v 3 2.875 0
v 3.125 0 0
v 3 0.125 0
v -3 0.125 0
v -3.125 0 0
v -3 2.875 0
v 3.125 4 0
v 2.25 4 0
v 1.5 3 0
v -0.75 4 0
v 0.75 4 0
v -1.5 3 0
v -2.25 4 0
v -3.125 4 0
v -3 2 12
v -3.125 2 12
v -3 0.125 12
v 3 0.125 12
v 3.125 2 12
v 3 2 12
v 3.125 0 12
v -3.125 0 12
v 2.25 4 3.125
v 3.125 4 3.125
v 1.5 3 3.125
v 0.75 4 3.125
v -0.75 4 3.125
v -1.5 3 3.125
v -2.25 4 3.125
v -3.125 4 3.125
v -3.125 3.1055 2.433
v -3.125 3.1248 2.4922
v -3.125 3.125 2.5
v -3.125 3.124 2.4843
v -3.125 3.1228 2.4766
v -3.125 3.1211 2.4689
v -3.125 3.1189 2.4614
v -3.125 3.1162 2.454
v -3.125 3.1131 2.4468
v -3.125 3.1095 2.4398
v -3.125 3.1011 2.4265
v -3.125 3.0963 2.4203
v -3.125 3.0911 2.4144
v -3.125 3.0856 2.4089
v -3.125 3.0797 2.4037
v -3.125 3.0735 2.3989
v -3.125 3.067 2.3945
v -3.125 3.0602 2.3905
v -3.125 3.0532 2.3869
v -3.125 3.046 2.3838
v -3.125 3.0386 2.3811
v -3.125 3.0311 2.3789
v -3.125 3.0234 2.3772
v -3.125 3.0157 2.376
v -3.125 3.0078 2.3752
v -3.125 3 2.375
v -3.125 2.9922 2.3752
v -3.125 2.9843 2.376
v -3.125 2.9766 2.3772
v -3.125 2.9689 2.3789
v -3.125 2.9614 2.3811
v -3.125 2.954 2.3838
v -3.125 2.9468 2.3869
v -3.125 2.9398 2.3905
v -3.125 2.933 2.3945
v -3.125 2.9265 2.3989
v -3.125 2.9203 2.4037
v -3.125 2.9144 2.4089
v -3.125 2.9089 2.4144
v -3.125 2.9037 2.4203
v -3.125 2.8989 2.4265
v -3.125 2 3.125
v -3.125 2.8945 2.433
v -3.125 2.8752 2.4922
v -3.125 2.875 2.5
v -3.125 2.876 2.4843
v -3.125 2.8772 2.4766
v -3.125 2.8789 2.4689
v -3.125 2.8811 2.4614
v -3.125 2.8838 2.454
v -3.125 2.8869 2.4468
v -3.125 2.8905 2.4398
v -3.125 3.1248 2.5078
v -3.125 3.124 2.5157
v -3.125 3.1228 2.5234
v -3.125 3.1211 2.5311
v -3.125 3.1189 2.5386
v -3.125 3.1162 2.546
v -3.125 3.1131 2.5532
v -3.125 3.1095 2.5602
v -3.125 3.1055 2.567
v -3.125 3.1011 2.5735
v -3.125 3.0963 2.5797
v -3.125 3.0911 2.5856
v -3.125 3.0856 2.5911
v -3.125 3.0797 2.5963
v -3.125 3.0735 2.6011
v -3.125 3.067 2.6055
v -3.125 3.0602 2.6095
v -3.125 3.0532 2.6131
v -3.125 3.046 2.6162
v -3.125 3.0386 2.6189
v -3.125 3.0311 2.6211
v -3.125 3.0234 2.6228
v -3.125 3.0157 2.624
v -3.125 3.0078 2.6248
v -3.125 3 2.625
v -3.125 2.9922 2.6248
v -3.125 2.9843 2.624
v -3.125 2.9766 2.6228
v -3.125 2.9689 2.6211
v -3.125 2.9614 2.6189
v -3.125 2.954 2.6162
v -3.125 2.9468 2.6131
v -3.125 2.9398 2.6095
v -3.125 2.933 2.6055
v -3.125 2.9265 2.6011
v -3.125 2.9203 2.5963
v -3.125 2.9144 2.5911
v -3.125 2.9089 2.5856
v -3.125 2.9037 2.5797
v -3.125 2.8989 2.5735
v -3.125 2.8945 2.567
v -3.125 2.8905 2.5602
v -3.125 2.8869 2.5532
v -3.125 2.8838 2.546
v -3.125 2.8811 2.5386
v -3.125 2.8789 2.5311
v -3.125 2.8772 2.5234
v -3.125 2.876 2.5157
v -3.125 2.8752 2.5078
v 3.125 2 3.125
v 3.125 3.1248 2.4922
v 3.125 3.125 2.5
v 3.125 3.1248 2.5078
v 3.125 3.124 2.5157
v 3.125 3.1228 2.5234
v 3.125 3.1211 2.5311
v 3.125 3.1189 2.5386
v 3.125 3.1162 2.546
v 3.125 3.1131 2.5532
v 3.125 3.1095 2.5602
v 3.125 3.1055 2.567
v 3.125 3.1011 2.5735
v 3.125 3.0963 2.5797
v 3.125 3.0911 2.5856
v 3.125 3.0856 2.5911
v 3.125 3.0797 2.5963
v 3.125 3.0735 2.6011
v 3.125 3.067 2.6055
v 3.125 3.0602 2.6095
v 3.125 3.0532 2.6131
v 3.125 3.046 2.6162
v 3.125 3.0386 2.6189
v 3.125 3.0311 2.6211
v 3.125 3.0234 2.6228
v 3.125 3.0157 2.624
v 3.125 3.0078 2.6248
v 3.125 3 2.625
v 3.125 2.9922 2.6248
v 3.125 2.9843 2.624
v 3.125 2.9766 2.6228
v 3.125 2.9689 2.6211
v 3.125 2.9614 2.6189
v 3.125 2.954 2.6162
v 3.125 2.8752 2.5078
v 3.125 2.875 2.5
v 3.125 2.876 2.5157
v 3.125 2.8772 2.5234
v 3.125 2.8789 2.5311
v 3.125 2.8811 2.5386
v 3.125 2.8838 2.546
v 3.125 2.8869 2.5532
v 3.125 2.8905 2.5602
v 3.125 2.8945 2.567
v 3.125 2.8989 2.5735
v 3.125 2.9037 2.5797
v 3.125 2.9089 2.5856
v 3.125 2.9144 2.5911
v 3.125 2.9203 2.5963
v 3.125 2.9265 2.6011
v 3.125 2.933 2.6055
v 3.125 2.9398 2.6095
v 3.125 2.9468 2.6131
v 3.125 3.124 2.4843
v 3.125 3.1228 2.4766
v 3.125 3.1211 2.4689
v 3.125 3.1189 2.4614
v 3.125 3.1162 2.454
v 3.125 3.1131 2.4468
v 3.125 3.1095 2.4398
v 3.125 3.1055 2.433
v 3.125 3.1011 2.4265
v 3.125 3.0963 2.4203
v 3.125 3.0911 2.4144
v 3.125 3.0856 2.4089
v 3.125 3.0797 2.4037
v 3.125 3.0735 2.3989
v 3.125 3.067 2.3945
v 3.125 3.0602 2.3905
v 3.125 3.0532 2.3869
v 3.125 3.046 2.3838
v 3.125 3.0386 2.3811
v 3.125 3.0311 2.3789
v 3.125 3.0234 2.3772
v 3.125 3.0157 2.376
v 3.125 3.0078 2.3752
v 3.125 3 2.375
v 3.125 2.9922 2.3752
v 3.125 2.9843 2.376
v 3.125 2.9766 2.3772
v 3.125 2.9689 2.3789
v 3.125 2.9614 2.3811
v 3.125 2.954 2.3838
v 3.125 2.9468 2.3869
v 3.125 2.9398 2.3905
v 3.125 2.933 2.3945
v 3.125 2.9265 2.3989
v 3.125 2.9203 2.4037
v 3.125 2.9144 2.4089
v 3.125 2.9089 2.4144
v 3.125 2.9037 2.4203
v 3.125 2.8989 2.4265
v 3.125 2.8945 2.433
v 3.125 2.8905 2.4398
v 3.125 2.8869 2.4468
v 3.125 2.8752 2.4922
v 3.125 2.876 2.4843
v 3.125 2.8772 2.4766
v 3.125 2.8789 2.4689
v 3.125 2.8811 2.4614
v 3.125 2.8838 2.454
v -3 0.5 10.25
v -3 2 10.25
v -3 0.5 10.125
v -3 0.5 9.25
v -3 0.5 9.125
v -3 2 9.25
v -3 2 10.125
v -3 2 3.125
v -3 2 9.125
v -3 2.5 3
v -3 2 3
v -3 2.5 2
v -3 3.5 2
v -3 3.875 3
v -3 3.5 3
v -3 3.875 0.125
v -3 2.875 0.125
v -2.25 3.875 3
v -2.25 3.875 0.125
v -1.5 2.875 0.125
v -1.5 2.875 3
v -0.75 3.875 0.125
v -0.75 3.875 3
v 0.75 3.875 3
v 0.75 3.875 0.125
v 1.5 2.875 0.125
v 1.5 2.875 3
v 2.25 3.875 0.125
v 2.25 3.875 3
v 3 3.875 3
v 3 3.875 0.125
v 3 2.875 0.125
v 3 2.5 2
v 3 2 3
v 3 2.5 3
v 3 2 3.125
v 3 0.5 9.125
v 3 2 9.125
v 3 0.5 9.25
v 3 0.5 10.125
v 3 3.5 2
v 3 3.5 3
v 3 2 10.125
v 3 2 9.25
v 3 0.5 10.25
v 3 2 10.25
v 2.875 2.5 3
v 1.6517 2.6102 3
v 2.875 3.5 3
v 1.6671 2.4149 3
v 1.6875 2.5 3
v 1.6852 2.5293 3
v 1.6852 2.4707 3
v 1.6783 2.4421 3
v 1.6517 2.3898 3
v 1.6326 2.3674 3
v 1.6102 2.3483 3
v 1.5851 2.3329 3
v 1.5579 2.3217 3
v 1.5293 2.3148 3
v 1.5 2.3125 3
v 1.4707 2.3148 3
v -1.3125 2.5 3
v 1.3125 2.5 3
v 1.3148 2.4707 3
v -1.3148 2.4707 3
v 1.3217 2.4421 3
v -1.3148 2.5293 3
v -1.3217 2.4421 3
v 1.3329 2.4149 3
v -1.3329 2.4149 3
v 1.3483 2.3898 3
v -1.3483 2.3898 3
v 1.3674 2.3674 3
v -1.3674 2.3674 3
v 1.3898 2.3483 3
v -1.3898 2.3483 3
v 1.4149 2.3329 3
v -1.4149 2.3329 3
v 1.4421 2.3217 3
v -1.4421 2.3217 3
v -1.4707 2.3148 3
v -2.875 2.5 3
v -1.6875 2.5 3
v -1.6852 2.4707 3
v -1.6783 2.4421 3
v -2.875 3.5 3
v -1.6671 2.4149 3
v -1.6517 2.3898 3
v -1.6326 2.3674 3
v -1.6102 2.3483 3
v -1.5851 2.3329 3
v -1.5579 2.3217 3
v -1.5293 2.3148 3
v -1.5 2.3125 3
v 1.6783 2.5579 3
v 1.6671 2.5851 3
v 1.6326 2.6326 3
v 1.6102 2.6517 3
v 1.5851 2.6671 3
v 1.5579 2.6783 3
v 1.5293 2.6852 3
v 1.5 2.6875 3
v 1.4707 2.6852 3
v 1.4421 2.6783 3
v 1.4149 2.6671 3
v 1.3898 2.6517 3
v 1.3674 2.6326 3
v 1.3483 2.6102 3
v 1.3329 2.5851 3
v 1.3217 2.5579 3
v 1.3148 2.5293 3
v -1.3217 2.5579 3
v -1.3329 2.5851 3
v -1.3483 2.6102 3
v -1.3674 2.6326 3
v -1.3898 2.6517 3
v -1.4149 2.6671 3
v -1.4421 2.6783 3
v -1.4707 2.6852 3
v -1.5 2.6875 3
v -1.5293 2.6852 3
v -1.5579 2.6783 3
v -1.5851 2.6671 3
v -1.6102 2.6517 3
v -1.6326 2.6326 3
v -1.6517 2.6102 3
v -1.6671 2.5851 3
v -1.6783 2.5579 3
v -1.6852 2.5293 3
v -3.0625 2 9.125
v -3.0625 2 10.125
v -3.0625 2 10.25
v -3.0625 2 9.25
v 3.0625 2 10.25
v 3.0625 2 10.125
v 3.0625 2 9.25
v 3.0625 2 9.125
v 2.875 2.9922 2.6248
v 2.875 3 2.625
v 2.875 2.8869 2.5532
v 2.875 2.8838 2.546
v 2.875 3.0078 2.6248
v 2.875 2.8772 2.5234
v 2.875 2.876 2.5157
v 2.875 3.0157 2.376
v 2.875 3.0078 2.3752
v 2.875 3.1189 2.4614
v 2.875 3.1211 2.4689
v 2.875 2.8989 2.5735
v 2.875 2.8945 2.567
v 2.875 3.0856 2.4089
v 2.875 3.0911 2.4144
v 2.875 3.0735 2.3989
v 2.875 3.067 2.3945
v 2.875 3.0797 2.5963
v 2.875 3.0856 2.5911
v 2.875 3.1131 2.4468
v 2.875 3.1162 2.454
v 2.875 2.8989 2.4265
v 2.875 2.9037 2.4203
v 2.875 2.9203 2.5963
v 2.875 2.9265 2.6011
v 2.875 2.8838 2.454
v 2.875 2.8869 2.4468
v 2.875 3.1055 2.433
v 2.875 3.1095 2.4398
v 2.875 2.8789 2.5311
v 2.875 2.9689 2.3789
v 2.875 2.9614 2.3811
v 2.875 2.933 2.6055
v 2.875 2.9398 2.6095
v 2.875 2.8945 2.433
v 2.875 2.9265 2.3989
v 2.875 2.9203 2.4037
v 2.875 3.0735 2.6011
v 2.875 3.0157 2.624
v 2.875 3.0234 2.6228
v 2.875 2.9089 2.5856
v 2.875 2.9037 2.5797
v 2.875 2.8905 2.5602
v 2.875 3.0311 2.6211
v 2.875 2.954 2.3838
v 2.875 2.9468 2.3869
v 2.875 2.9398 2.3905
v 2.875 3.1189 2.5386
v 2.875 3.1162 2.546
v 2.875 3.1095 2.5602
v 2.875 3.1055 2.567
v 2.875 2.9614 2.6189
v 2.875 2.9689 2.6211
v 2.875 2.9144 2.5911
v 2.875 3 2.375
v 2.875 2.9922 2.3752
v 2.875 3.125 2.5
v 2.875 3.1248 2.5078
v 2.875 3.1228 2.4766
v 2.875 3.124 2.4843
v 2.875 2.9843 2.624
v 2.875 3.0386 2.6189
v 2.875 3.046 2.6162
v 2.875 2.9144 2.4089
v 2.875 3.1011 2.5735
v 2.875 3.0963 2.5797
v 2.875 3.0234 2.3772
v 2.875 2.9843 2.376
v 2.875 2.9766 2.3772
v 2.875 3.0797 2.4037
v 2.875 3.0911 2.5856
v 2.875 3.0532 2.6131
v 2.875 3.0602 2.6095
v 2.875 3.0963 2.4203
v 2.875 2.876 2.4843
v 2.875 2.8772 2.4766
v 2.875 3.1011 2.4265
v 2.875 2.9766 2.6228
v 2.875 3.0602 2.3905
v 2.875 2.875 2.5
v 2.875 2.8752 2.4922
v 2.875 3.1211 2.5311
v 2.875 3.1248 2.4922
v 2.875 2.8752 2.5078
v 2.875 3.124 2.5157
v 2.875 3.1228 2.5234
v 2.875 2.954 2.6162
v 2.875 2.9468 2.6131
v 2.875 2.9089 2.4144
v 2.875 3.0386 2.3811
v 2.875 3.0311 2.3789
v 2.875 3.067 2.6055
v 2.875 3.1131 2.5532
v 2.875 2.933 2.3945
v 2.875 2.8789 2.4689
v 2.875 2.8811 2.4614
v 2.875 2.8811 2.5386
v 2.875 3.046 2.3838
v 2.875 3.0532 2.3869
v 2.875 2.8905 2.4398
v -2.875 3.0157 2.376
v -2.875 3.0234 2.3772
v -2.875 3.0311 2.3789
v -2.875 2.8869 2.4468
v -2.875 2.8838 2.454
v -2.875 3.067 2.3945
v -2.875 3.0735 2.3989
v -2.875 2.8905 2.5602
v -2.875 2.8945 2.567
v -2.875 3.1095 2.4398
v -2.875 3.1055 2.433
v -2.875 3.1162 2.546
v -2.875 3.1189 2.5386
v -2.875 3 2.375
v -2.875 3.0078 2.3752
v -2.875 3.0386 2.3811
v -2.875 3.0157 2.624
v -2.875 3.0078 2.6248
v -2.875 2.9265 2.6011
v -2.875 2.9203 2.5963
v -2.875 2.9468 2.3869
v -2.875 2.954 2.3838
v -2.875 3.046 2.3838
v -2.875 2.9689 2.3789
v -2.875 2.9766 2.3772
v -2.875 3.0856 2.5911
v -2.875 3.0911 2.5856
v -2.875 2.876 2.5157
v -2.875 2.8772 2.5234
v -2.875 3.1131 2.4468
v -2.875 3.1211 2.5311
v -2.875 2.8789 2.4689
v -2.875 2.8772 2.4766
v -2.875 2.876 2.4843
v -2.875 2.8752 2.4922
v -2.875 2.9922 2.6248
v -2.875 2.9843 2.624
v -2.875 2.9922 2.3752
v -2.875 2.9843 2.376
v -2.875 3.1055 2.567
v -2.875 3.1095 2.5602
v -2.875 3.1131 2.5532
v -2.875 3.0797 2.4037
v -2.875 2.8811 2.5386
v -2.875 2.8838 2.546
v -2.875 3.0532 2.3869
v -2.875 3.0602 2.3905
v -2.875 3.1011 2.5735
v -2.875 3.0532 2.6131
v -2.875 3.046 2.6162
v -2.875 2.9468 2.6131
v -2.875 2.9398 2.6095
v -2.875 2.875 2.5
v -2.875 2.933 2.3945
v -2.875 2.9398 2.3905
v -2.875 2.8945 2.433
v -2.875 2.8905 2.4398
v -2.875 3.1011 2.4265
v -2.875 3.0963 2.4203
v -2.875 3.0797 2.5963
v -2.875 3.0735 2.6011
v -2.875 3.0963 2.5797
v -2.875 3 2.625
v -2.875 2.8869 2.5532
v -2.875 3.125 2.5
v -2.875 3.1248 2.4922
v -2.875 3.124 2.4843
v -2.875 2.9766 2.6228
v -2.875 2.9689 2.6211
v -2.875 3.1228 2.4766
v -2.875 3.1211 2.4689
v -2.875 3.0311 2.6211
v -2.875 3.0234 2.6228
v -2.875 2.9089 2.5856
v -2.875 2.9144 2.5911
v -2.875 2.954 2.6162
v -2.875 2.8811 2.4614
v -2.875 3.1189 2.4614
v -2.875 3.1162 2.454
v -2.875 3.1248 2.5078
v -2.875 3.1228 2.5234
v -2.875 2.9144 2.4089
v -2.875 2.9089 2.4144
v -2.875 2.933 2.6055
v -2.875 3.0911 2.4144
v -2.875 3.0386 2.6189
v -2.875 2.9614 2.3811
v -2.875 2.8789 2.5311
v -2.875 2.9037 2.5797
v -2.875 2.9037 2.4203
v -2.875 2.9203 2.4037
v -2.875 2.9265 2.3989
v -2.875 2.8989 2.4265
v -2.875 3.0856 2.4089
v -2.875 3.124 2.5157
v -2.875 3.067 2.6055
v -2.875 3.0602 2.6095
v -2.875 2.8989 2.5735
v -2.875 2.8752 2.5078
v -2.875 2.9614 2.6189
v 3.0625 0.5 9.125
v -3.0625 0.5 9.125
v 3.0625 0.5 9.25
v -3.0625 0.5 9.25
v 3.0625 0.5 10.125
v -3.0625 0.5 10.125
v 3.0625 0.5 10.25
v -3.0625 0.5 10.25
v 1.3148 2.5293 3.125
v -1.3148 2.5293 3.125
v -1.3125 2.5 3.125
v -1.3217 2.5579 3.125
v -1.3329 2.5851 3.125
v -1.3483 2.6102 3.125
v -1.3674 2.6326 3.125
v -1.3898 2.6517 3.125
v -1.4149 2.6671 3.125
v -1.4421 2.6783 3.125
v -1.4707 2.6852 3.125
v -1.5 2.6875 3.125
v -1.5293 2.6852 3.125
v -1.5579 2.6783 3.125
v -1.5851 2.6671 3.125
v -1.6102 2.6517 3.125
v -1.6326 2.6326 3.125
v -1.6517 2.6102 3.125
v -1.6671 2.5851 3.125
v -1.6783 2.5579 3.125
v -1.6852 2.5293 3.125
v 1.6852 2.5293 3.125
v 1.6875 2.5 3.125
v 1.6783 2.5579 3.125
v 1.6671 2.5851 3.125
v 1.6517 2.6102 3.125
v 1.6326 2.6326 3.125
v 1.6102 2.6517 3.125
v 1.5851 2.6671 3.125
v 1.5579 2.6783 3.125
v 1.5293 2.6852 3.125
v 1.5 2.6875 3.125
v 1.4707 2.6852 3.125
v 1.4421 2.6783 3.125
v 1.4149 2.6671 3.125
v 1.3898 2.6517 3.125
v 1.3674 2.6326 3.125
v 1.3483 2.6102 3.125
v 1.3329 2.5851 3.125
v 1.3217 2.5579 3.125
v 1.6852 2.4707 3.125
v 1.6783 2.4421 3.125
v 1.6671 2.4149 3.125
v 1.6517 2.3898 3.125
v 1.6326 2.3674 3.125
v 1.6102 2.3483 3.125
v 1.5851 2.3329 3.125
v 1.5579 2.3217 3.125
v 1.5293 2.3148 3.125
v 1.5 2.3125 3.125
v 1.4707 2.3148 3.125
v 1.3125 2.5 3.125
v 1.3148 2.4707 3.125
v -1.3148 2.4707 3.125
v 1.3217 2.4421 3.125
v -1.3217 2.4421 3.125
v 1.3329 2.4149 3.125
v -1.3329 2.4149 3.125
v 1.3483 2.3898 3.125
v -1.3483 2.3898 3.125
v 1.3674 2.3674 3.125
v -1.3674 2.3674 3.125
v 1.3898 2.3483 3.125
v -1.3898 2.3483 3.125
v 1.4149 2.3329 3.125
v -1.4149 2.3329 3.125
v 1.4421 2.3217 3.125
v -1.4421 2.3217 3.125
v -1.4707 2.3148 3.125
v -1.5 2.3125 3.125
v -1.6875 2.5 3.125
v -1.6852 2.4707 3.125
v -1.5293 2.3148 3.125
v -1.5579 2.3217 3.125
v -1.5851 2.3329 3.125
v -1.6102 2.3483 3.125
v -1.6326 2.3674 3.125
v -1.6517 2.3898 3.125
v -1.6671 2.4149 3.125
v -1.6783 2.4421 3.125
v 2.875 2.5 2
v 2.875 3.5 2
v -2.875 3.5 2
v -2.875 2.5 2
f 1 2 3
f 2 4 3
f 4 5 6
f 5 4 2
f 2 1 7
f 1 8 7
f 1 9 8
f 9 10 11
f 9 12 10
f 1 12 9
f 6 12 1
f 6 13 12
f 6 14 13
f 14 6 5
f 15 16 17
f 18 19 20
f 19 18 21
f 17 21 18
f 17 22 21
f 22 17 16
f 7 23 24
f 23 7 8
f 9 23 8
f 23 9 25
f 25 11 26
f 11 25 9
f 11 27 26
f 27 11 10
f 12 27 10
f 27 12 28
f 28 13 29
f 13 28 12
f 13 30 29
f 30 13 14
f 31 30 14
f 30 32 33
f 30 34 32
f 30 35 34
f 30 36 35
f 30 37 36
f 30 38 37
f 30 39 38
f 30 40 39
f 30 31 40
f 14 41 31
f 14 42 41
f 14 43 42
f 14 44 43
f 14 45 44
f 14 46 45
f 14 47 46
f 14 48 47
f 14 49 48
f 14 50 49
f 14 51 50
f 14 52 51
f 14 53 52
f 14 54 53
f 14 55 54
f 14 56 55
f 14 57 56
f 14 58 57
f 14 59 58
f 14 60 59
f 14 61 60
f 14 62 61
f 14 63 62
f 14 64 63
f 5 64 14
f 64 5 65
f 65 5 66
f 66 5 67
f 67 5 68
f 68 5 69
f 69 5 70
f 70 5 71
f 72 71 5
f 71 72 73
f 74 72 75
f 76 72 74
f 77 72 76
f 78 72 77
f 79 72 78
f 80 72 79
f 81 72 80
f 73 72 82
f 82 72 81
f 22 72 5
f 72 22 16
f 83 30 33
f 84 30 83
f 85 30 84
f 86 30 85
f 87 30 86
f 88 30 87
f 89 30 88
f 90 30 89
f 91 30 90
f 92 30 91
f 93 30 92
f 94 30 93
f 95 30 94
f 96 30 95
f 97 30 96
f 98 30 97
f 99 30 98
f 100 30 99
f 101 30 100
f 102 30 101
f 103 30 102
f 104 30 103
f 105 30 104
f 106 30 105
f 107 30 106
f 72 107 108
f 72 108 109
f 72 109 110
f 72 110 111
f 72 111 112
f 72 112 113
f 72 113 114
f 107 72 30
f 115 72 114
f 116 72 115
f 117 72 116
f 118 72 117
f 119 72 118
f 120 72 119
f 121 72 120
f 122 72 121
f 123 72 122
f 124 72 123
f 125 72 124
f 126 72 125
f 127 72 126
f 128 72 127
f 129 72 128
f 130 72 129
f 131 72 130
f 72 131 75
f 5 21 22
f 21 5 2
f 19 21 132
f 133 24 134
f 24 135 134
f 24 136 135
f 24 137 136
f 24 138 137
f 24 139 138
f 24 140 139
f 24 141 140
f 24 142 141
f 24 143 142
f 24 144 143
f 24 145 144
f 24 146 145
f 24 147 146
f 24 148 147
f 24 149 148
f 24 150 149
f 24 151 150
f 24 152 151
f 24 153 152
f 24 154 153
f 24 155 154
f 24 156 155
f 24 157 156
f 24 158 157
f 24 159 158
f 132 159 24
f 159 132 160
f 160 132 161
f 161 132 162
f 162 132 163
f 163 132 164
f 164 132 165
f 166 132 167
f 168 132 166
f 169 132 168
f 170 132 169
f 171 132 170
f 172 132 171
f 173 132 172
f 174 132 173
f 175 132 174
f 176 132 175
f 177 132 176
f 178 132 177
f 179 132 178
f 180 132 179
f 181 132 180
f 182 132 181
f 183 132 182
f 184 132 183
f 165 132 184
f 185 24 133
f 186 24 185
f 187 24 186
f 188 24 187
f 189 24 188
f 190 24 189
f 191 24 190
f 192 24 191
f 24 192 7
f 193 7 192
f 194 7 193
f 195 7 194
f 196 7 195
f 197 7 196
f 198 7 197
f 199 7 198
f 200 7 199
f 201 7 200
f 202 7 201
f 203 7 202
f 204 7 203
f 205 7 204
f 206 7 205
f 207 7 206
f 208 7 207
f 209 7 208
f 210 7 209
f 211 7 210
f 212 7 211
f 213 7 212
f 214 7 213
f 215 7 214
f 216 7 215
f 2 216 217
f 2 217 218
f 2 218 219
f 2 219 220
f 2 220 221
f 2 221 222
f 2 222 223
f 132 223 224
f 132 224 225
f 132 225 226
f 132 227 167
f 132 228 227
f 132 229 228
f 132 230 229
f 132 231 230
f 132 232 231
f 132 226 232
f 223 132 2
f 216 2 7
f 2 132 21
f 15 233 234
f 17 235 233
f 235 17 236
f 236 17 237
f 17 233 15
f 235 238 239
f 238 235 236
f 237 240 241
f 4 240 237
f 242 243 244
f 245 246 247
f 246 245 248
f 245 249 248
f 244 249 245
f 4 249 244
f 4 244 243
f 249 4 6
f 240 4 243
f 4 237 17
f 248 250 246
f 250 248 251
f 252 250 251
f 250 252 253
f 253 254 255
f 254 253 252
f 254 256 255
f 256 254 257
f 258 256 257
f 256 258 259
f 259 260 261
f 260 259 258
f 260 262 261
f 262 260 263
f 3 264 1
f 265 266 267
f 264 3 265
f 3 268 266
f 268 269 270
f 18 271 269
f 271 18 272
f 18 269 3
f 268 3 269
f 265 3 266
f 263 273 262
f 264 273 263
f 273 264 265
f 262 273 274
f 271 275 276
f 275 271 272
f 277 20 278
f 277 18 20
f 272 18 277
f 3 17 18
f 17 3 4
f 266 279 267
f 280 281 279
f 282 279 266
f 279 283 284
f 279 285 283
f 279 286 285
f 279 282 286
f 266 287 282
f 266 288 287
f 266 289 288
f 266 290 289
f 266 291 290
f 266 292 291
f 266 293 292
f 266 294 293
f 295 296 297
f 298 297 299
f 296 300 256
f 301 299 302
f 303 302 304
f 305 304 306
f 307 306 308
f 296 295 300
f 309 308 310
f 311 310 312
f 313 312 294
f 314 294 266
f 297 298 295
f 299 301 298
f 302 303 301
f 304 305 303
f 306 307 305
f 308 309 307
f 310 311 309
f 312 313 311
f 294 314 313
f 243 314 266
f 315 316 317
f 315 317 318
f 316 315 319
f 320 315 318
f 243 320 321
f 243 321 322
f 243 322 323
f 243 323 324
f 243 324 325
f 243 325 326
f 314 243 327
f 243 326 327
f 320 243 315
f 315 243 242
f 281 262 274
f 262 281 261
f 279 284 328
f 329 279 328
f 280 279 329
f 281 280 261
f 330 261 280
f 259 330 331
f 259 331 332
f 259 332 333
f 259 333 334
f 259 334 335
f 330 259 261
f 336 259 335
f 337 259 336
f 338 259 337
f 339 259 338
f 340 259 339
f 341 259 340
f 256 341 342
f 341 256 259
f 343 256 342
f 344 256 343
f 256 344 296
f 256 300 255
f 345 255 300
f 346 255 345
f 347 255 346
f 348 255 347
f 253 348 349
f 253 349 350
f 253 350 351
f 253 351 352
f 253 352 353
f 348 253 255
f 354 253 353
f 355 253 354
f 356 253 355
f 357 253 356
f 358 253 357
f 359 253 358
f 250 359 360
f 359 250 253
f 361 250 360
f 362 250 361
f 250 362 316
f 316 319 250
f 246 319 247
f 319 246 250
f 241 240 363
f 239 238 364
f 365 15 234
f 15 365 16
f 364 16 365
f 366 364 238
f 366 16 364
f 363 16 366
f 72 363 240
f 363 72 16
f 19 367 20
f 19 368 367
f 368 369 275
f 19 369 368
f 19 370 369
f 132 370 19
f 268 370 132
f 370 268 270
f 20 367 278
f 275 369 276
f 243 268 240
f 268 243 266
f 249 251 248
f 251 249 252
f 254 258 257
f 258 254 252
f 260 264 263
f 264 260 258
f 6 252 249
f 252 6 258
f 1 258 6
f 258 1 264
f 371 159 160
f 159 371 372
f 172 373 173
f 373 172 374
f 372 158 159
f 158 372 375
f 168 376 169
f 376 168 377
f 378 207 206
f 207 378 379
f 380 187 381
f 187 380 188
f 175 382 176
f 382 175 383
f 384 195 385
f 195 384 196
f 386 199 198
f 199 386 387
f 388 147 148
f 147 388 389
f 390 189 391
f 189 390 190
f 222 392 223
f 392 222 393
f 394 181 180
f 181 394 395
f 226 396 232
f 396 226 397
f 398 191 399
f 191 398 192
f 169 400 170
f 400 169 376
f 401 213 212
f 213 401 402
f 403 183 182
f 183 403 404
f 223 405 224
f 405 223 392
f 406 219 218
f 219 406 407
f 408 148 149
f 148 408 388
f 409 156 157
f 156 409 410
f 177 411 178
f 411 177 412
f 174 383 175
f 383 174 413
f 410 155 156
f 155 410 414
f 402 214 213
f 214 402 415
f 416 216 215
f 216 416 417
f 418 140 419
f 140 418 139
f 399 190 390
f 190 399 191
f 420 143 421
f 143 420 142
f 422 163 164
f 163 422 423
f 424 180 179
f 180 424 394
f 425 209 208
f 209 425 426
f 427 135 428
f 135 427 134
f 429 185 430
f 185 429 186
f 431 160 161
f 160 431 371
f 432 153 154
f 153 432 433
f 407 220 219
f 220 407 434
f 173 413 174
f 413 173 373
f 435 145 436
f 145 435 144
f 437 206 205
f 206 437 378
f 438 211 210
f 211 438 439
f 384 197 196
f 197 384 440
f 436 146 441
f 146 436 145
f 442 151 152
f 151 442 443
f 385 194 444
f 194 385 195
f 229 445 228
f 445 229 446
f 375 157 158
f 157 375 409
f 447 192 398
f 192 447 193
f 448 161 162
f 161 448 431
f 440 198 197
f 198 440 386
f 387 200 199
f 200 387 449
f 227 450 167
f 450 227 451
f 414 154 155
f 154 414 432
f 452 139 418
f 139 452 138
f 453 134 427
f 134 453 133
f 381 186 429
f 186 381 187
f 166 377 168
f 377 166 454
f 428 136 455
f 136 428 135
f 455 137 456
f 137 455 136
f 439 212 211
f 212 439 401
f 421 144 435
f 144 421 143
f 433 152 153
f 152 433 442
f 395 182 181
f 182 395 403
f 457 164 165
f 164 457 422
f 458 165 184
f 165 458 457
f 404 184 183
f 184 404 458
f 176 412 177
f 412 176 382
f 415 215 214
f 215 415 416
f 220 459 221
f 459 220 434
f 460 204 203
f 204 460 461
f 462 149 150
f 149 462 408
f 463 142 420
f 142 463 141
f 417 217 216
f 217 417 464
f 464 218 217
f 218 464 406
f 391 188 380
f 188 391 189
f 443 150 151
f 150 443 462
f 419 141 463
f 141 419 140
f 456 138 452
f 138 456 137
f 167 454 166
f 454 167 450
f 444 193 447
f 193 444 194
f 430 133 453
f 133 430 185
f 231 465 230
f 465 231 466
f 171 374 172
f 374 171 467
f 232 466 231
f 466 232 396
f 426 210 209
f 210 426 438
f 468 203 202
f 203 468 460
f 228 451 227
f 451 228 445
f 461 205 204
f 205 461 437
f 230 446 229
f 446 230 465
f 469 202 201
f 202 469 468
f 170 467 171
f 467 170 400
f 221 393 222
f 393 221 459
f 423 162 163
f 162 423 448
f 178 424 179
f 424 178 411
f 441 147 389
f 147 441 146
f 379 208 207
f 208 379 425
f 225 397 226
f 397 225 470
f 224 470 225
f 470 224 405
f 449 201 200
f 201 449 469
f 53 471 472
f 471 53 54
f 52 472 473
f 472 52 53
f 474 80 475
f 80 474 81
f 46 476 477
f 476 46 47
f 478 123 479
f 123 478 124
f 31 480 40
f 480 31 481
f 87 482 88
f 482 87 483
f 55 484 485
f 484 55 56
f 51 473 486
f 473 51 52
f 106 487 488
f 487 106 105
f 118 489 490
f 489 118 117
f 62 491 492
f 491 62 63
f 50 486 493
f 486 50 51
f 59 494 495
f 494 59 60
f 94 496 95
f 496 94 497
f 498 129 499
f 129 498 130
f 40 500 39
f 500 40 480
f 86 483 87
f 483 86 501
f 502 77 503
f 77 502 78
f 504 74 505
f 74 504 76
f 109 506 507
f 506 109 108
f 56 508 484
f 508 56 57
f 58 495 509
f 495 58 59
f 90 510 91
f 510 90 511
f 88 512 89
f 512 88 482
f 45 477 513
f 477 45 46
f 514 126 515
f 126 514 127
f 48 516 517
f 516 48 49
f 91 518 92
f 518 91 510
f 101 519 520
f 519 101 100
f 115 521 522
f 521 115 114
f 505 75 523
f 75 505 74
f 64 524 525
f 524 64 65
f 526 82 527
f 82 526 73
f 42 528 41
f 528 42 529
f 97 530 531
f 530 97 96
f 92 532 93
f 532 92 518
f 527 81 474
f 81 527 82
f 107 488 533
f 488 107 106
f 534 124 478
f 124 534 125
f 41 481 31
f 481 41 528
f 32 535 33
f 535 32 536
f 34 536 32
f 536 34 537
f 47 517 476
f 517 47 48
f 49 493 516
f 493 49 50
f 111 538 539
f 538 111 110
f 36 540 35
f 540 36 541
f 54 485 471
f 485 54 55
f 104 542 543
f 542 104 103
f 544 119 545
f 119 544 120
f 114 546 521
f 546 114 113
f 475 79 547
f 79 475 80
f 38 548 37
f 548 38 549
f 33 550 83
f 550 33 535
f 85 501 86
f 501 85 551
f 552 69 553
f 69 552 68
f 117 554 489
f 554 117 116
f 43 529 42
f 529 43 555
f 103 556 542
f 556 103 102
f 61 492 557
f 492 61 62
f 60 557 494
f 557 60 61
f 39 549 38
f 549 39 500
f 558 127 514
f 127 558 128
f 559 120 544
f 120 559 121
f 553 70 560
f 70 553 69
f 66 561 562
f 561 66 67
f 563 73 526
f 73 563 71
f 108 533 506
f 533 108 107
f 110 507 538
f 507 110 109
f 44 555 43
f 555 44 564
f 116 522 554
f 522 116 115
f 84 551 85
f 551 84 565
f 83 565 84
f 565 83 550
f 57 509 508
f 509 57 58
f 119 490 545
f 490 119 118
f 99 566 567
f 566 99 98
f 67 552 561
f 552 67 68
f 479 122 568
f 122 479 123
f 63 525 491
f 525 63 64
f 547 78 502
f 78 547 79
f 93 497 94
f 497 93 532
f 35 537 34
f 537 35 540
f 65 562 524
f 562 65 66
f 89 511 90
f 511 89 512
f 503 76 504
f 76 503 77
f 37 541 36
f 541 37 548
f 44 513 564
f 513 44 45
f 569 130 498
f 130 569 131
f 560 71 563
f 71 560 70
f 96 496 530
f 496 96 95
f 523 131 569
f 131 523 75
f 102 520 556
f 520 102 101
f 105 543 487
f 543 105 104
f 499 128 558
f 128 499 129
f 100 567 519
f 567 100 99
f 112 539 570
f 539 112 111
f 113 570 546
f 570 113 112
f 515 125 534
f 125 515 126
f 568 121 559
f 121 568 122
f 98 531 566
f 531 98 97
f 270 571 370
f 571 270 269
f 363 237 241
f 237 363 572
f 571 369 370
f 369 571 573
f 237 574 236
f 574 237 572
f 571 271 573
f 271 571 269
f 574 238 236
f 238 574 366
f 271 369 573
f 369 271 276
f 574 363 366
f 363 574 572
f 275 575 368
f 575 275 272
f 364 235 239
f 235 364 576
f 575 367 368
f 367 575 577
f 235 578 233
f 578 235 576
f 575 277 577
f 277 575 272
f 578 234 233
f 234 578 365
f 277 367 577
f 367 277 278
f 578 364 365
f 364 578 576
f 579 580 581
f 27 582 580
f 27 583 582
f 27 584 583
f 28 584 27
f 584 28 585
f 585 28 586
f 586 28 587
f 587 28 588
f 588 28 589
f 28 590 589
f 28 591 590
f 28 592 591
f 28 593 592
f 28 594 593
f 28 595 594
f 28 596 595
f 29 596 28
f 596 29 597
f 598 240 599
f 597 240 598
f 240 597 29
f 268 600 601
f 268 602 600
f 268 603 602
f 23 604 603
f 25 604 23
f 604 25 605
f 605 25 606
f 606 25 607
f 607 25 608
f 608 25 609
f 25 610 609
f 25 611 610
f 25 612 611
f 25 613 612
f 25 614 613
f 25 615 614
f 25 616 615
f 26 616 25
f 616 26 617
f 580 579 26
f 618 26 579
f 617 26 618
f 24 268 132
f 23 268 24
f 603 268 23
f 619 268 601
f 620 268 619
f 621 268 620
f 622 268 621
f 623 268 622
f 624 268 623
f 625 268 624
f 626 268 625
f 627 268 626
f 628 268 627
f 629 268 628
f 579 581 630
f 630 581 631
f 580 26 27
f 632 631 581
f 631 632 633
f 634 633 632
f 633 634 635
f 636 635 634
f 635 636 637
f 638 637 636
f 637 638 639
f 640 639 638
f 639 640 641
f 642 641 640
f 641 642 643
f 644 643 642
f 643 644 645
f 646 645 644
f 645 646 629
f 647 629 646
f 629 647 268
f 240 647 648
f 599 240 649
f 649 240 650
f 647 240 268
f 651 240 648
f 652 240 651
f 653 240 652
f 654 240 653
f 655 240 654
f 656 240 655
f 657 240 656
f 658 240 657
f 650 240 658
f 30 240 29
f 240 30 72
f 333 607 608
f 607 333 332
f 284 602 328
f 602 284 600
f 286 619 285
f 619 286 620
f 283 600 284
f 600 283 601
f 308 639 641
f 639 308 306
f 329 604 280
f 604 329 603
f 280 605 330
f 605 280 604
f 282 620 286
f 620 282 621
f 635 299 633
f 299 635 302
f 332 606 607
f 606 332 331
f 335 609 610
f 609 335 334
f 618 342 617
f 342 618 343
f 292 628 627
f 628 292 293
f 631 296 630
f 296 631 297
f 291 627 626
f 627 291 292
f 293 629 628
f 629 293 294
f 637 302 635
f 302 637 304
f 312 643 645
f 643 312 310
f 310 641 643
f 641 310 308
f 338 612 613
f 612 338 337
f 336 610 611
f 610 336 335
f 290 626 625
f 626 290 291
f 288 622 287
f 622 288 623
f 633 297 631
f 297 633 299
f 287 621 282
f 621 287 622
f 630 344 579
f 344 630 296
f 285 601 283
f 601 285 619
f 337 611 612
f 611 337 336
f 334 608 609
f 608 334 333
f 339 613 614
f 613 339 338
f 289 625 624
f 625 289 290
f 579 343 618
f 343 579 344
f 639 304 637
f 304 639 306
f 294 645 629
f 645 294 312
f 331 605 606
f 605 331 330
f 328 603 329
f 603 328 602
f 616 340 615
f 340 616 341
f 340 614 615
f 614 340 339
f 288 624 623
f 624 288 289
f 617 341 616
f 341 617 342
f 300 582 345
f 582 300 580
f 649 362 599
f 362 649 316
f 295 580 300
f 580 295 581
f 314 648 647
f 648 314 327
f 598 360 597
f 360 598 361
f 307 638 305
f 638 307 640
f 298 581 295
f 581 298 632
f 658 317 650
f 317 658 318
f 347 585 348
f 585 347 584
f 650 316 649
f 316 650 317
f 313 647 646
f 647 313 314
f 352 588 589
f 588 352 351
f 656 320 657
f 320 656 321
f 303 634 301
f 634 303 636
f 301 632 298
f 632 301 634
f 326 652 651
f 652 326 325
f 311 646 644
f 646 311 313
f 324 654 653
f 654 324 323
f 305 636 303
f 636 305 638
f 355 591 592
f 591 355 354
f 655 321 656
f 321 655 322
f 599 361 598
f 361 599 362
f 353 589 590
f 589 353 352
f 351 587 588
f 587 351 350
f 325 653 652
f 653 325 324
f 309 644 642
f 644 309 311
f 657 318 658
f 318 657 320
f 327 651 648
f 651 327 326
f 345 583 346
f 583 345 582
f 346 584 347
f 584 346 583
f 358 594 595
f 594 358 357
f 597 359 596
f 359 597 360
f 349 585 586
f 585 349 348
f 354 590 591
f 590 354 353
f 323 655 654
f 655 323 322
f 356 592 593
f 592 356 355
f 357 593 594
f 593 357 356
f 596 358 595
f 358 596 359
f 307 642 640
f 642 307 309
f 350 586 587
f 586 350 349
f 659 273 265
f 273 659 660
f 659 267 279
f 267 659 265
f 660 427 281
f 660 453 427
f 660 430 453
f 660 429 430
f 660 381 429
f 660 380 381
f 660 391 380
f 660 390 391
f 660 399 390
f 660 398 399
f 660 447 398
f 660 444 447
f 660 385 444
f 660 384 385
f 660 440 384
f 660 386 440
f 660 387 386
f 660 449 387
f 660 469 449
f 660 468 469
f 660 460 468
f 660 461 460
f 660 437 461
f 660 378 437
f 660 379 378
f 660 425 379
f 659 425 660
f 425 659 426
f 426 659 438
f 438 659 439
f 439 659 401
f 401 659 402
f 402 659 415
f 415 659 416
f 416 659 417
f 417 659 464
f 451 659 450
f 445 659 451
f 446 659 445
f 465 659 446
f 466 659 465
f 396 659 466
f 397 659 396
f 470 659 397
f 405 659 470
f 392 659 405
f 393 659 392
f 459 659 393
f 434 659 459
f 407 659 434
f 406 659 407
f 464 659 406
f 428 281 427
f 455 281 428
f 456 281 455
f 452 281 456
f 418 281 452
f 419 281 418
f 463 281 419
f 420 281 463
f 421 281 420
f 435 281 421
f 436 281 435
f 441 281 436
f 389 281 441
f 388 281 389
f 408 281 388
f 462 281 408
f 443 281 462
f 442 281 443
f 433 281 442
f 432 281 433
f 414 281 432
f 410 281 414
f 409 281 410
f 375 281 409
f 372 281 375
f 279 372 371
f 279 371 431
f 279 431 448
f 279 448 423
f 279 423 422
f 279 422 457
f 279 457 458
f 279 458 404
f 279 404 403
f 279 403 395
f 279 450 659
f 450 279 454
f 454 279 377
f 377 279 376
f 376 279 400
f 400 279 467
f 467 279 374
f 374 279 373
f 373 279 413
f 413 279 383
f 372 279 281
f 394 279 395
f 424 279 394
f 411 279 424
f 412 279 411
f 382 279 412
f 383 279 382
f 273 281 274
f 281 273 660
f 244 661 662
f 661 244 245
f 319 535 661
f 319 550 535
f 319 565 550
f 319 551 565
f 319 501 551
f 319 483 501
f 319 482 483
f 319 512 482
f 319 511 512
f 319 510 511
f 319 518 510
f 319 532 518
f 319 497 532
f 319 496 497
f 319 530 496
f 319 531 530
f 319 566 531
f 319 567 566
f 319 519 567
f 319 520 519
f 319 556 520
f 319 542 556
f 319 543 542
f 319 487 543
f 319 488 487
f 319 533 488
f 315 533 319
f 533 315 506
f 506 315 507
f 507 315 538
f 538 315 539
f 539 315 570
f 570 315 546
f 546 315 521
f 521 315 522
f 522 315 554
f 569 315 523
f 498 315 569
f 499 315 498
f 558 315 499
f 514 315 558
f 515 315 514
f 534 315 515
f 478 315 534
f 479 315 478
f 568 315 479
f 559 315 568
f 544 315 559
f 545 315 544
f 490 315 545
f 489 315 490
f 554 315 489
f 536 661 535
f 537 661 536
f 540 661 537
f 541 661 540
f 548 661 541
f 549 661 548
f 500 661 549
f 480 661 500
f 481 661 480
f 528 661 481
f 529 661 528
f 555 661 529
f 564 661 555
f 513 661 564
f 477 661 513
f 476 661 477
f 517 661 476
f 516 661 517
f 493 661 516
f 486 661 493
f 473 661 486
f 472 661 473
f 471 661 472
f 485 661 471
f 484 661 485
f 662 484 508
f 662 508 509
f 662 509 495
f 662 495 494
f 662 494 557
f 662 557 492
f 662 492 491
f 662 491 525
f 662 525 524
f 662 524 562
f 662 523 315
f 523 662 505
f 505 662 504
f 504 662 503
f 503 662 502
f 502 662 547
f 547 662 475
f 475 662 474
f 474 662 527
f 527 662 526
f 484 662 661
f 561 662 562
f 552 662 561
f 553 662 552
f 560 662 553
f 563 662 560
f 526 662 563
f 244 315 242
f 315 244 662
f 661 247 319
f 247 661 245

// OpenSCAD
    $fn=40;
//definiere Punkte für Polygon d. Querschnittes. X...äußerer Punkt. 
//X1...Punkt X um Wandstärke (=0.125) hineinversetzt
A=[-3.125, 0];              A1=[-3,0.125];
B=[3.125, 0];               B1=[3,0.125];
C=[3.125, 4];               C1=[3, 3.875];
D=[2.25, 4];                D1=[2.25, 3.875];
E=[1.5, 3];                 E1=[1.5, 2.875]; 
F=[0.75, 4];                F1=[0.75, 3.875]; 
G=[-0.75, 4];               G1=[-0.75, 3.875];
H=[-1.5, 3];                H1=[-1.5, 2.875];
I=[-2.25, 4];               I1=[-2.25, 3.875];
J=[-3.125, 4];              J1=[-3, 3.875];
K=[-3.125, 2.875];
L=[3.125, 2.875];

//Koordinaten für Befestigungsquader am grünen Teil (innen 1 inch x 1 inch)
Q=[3,2.5];
R=[2.875,2.5];
S=[2.875,3.5];
T=[3,3.5];
Q2=[-3,2.5];
R2=[-2.875,2.5];
S2=[-2.875,3.5];
T2=[-3,3.5];

//Koordinaten für große Platte mit Schiene
a=[3.0625,3.75];
b=[-3.0625,3.75];
c=[-3.0625,0.5];
d=[3.0625,0.5];


A4=[-3.125, 2]; //grüner linker hintere Ecke clemens
B4=[3.125, 2];  //grüne linke vordere Ecke

// äußere difference funktion für bohrung an den Seiten durch Hauptteil
difference () {
    
union(){
    
difference() {
linear_extrude(height = 12, convexity = 10, twist = 0)                      
    //height=12 in = 1 ft
polygon(points=[A,B,C,D,E,F,G,H,I,J, A1, B1, C1, D1, E1, F1, G1, H1, I1, J1], paths=[[0,1,2,3,4,5,6,7,8,9],[10,11,12,13,14,15,16,17,18,19]]);
translate([-5,2,3])
cube(10);
}
linear_extrude(height = 0.125, convexity = 10, twist = 0)
polygon(points=[K,L,C,D,E,F,G,H,I,J], paths=[[0,1,2,3,4,5,6,7,8,9]]);


}
zylinder1();
zylinder2();
bigSchiene();
smallSchiene();
}


/* es fehlt noch an obigem Teil:    
        *Bohrungen
        *"Schienen" 
        *Löcher für Rastnasen oder ähnliches zum Zusammenstecken
*/

{

//translate([0, 0, 0])

A4=[-3.125, 2];
B4=[3.125, 2];                           
C4=[3.125, 4];
D4=[-3.125, 4]; 

  


//linear_extrude(height = 0.125, convexity = 10, twist = 0)
//polygon(points=[A4, B4, C4,D4]);



}



union(){

translate([0, 0, 3])


//grüner Teil Anfang


 
difference(){


linear_extrude(height = 0.125, convexity = 10, twist = 0)

//polygon(points=[A, B, C,D, E, F, G]), paths=[[0,1,2,3,4,5,6]]);





polygon(points=[A4, B4, C, D, E, F, G, H, I, J]);
  
   
translate([1.5, 2.5, 0])
bohrung(inner_circle_r);

translate([-1.5, 2.5, 0])
bohrung(inner_circle_r); 
    
}


//grüner Teil Ende

//Befestigung grünes Teil (Mutter-Schraube)




//Quader1

//difference=Bohrung
difference(){

translate([0,0,2])

linear_extrude(height = 1, convexity = 10, twist = 0)
polygon(points=[Q,R,S,T]);
    zylinder1();
}

//Quader2

difference(){
translate([0,0,2])

linear_extrude(height = 1, convexity = 10, twist = 0)
polygon(points=[Q2,R2,S2,T2]);
zylinder2();
    }
}




//die beiden Zylinder für die Bohrungen
module zylinder1()
    {
translate([5,3,2.5])
rotate([0,-90,0])
cylinder(r=0.125,h=2.5,$fn=100);
    }
    
    module zylinder2()
    {
translate([-5,3,2.5])
rotate([0,90,0])
cylinder(r=0.125,h=2.5,$fn=100);
    }
    
    
//zylinder2();
//zylinder1();
    
inner_circle_r = 0.1875; //3/16 inch
module bohrung(x) 
{
linear_extrude(height = 0.4, center = true, convexity = 10, twist = 0)
circle(inner_circle_r);
}

module bigSchiene()
{
    translate([0,0,9.125])
    linear_extrude(height=0.125, convexity=10, twist=0)
    polygon(points=[a,b,c,d]);
    }
    
module smallSchiene()
{
    translate([0,0,10.125])
    linear_extrude(height=0.125, convexity=10, twist=0)
    polygon(points=[a,b,c,d]);
    }
//bigPlate();
